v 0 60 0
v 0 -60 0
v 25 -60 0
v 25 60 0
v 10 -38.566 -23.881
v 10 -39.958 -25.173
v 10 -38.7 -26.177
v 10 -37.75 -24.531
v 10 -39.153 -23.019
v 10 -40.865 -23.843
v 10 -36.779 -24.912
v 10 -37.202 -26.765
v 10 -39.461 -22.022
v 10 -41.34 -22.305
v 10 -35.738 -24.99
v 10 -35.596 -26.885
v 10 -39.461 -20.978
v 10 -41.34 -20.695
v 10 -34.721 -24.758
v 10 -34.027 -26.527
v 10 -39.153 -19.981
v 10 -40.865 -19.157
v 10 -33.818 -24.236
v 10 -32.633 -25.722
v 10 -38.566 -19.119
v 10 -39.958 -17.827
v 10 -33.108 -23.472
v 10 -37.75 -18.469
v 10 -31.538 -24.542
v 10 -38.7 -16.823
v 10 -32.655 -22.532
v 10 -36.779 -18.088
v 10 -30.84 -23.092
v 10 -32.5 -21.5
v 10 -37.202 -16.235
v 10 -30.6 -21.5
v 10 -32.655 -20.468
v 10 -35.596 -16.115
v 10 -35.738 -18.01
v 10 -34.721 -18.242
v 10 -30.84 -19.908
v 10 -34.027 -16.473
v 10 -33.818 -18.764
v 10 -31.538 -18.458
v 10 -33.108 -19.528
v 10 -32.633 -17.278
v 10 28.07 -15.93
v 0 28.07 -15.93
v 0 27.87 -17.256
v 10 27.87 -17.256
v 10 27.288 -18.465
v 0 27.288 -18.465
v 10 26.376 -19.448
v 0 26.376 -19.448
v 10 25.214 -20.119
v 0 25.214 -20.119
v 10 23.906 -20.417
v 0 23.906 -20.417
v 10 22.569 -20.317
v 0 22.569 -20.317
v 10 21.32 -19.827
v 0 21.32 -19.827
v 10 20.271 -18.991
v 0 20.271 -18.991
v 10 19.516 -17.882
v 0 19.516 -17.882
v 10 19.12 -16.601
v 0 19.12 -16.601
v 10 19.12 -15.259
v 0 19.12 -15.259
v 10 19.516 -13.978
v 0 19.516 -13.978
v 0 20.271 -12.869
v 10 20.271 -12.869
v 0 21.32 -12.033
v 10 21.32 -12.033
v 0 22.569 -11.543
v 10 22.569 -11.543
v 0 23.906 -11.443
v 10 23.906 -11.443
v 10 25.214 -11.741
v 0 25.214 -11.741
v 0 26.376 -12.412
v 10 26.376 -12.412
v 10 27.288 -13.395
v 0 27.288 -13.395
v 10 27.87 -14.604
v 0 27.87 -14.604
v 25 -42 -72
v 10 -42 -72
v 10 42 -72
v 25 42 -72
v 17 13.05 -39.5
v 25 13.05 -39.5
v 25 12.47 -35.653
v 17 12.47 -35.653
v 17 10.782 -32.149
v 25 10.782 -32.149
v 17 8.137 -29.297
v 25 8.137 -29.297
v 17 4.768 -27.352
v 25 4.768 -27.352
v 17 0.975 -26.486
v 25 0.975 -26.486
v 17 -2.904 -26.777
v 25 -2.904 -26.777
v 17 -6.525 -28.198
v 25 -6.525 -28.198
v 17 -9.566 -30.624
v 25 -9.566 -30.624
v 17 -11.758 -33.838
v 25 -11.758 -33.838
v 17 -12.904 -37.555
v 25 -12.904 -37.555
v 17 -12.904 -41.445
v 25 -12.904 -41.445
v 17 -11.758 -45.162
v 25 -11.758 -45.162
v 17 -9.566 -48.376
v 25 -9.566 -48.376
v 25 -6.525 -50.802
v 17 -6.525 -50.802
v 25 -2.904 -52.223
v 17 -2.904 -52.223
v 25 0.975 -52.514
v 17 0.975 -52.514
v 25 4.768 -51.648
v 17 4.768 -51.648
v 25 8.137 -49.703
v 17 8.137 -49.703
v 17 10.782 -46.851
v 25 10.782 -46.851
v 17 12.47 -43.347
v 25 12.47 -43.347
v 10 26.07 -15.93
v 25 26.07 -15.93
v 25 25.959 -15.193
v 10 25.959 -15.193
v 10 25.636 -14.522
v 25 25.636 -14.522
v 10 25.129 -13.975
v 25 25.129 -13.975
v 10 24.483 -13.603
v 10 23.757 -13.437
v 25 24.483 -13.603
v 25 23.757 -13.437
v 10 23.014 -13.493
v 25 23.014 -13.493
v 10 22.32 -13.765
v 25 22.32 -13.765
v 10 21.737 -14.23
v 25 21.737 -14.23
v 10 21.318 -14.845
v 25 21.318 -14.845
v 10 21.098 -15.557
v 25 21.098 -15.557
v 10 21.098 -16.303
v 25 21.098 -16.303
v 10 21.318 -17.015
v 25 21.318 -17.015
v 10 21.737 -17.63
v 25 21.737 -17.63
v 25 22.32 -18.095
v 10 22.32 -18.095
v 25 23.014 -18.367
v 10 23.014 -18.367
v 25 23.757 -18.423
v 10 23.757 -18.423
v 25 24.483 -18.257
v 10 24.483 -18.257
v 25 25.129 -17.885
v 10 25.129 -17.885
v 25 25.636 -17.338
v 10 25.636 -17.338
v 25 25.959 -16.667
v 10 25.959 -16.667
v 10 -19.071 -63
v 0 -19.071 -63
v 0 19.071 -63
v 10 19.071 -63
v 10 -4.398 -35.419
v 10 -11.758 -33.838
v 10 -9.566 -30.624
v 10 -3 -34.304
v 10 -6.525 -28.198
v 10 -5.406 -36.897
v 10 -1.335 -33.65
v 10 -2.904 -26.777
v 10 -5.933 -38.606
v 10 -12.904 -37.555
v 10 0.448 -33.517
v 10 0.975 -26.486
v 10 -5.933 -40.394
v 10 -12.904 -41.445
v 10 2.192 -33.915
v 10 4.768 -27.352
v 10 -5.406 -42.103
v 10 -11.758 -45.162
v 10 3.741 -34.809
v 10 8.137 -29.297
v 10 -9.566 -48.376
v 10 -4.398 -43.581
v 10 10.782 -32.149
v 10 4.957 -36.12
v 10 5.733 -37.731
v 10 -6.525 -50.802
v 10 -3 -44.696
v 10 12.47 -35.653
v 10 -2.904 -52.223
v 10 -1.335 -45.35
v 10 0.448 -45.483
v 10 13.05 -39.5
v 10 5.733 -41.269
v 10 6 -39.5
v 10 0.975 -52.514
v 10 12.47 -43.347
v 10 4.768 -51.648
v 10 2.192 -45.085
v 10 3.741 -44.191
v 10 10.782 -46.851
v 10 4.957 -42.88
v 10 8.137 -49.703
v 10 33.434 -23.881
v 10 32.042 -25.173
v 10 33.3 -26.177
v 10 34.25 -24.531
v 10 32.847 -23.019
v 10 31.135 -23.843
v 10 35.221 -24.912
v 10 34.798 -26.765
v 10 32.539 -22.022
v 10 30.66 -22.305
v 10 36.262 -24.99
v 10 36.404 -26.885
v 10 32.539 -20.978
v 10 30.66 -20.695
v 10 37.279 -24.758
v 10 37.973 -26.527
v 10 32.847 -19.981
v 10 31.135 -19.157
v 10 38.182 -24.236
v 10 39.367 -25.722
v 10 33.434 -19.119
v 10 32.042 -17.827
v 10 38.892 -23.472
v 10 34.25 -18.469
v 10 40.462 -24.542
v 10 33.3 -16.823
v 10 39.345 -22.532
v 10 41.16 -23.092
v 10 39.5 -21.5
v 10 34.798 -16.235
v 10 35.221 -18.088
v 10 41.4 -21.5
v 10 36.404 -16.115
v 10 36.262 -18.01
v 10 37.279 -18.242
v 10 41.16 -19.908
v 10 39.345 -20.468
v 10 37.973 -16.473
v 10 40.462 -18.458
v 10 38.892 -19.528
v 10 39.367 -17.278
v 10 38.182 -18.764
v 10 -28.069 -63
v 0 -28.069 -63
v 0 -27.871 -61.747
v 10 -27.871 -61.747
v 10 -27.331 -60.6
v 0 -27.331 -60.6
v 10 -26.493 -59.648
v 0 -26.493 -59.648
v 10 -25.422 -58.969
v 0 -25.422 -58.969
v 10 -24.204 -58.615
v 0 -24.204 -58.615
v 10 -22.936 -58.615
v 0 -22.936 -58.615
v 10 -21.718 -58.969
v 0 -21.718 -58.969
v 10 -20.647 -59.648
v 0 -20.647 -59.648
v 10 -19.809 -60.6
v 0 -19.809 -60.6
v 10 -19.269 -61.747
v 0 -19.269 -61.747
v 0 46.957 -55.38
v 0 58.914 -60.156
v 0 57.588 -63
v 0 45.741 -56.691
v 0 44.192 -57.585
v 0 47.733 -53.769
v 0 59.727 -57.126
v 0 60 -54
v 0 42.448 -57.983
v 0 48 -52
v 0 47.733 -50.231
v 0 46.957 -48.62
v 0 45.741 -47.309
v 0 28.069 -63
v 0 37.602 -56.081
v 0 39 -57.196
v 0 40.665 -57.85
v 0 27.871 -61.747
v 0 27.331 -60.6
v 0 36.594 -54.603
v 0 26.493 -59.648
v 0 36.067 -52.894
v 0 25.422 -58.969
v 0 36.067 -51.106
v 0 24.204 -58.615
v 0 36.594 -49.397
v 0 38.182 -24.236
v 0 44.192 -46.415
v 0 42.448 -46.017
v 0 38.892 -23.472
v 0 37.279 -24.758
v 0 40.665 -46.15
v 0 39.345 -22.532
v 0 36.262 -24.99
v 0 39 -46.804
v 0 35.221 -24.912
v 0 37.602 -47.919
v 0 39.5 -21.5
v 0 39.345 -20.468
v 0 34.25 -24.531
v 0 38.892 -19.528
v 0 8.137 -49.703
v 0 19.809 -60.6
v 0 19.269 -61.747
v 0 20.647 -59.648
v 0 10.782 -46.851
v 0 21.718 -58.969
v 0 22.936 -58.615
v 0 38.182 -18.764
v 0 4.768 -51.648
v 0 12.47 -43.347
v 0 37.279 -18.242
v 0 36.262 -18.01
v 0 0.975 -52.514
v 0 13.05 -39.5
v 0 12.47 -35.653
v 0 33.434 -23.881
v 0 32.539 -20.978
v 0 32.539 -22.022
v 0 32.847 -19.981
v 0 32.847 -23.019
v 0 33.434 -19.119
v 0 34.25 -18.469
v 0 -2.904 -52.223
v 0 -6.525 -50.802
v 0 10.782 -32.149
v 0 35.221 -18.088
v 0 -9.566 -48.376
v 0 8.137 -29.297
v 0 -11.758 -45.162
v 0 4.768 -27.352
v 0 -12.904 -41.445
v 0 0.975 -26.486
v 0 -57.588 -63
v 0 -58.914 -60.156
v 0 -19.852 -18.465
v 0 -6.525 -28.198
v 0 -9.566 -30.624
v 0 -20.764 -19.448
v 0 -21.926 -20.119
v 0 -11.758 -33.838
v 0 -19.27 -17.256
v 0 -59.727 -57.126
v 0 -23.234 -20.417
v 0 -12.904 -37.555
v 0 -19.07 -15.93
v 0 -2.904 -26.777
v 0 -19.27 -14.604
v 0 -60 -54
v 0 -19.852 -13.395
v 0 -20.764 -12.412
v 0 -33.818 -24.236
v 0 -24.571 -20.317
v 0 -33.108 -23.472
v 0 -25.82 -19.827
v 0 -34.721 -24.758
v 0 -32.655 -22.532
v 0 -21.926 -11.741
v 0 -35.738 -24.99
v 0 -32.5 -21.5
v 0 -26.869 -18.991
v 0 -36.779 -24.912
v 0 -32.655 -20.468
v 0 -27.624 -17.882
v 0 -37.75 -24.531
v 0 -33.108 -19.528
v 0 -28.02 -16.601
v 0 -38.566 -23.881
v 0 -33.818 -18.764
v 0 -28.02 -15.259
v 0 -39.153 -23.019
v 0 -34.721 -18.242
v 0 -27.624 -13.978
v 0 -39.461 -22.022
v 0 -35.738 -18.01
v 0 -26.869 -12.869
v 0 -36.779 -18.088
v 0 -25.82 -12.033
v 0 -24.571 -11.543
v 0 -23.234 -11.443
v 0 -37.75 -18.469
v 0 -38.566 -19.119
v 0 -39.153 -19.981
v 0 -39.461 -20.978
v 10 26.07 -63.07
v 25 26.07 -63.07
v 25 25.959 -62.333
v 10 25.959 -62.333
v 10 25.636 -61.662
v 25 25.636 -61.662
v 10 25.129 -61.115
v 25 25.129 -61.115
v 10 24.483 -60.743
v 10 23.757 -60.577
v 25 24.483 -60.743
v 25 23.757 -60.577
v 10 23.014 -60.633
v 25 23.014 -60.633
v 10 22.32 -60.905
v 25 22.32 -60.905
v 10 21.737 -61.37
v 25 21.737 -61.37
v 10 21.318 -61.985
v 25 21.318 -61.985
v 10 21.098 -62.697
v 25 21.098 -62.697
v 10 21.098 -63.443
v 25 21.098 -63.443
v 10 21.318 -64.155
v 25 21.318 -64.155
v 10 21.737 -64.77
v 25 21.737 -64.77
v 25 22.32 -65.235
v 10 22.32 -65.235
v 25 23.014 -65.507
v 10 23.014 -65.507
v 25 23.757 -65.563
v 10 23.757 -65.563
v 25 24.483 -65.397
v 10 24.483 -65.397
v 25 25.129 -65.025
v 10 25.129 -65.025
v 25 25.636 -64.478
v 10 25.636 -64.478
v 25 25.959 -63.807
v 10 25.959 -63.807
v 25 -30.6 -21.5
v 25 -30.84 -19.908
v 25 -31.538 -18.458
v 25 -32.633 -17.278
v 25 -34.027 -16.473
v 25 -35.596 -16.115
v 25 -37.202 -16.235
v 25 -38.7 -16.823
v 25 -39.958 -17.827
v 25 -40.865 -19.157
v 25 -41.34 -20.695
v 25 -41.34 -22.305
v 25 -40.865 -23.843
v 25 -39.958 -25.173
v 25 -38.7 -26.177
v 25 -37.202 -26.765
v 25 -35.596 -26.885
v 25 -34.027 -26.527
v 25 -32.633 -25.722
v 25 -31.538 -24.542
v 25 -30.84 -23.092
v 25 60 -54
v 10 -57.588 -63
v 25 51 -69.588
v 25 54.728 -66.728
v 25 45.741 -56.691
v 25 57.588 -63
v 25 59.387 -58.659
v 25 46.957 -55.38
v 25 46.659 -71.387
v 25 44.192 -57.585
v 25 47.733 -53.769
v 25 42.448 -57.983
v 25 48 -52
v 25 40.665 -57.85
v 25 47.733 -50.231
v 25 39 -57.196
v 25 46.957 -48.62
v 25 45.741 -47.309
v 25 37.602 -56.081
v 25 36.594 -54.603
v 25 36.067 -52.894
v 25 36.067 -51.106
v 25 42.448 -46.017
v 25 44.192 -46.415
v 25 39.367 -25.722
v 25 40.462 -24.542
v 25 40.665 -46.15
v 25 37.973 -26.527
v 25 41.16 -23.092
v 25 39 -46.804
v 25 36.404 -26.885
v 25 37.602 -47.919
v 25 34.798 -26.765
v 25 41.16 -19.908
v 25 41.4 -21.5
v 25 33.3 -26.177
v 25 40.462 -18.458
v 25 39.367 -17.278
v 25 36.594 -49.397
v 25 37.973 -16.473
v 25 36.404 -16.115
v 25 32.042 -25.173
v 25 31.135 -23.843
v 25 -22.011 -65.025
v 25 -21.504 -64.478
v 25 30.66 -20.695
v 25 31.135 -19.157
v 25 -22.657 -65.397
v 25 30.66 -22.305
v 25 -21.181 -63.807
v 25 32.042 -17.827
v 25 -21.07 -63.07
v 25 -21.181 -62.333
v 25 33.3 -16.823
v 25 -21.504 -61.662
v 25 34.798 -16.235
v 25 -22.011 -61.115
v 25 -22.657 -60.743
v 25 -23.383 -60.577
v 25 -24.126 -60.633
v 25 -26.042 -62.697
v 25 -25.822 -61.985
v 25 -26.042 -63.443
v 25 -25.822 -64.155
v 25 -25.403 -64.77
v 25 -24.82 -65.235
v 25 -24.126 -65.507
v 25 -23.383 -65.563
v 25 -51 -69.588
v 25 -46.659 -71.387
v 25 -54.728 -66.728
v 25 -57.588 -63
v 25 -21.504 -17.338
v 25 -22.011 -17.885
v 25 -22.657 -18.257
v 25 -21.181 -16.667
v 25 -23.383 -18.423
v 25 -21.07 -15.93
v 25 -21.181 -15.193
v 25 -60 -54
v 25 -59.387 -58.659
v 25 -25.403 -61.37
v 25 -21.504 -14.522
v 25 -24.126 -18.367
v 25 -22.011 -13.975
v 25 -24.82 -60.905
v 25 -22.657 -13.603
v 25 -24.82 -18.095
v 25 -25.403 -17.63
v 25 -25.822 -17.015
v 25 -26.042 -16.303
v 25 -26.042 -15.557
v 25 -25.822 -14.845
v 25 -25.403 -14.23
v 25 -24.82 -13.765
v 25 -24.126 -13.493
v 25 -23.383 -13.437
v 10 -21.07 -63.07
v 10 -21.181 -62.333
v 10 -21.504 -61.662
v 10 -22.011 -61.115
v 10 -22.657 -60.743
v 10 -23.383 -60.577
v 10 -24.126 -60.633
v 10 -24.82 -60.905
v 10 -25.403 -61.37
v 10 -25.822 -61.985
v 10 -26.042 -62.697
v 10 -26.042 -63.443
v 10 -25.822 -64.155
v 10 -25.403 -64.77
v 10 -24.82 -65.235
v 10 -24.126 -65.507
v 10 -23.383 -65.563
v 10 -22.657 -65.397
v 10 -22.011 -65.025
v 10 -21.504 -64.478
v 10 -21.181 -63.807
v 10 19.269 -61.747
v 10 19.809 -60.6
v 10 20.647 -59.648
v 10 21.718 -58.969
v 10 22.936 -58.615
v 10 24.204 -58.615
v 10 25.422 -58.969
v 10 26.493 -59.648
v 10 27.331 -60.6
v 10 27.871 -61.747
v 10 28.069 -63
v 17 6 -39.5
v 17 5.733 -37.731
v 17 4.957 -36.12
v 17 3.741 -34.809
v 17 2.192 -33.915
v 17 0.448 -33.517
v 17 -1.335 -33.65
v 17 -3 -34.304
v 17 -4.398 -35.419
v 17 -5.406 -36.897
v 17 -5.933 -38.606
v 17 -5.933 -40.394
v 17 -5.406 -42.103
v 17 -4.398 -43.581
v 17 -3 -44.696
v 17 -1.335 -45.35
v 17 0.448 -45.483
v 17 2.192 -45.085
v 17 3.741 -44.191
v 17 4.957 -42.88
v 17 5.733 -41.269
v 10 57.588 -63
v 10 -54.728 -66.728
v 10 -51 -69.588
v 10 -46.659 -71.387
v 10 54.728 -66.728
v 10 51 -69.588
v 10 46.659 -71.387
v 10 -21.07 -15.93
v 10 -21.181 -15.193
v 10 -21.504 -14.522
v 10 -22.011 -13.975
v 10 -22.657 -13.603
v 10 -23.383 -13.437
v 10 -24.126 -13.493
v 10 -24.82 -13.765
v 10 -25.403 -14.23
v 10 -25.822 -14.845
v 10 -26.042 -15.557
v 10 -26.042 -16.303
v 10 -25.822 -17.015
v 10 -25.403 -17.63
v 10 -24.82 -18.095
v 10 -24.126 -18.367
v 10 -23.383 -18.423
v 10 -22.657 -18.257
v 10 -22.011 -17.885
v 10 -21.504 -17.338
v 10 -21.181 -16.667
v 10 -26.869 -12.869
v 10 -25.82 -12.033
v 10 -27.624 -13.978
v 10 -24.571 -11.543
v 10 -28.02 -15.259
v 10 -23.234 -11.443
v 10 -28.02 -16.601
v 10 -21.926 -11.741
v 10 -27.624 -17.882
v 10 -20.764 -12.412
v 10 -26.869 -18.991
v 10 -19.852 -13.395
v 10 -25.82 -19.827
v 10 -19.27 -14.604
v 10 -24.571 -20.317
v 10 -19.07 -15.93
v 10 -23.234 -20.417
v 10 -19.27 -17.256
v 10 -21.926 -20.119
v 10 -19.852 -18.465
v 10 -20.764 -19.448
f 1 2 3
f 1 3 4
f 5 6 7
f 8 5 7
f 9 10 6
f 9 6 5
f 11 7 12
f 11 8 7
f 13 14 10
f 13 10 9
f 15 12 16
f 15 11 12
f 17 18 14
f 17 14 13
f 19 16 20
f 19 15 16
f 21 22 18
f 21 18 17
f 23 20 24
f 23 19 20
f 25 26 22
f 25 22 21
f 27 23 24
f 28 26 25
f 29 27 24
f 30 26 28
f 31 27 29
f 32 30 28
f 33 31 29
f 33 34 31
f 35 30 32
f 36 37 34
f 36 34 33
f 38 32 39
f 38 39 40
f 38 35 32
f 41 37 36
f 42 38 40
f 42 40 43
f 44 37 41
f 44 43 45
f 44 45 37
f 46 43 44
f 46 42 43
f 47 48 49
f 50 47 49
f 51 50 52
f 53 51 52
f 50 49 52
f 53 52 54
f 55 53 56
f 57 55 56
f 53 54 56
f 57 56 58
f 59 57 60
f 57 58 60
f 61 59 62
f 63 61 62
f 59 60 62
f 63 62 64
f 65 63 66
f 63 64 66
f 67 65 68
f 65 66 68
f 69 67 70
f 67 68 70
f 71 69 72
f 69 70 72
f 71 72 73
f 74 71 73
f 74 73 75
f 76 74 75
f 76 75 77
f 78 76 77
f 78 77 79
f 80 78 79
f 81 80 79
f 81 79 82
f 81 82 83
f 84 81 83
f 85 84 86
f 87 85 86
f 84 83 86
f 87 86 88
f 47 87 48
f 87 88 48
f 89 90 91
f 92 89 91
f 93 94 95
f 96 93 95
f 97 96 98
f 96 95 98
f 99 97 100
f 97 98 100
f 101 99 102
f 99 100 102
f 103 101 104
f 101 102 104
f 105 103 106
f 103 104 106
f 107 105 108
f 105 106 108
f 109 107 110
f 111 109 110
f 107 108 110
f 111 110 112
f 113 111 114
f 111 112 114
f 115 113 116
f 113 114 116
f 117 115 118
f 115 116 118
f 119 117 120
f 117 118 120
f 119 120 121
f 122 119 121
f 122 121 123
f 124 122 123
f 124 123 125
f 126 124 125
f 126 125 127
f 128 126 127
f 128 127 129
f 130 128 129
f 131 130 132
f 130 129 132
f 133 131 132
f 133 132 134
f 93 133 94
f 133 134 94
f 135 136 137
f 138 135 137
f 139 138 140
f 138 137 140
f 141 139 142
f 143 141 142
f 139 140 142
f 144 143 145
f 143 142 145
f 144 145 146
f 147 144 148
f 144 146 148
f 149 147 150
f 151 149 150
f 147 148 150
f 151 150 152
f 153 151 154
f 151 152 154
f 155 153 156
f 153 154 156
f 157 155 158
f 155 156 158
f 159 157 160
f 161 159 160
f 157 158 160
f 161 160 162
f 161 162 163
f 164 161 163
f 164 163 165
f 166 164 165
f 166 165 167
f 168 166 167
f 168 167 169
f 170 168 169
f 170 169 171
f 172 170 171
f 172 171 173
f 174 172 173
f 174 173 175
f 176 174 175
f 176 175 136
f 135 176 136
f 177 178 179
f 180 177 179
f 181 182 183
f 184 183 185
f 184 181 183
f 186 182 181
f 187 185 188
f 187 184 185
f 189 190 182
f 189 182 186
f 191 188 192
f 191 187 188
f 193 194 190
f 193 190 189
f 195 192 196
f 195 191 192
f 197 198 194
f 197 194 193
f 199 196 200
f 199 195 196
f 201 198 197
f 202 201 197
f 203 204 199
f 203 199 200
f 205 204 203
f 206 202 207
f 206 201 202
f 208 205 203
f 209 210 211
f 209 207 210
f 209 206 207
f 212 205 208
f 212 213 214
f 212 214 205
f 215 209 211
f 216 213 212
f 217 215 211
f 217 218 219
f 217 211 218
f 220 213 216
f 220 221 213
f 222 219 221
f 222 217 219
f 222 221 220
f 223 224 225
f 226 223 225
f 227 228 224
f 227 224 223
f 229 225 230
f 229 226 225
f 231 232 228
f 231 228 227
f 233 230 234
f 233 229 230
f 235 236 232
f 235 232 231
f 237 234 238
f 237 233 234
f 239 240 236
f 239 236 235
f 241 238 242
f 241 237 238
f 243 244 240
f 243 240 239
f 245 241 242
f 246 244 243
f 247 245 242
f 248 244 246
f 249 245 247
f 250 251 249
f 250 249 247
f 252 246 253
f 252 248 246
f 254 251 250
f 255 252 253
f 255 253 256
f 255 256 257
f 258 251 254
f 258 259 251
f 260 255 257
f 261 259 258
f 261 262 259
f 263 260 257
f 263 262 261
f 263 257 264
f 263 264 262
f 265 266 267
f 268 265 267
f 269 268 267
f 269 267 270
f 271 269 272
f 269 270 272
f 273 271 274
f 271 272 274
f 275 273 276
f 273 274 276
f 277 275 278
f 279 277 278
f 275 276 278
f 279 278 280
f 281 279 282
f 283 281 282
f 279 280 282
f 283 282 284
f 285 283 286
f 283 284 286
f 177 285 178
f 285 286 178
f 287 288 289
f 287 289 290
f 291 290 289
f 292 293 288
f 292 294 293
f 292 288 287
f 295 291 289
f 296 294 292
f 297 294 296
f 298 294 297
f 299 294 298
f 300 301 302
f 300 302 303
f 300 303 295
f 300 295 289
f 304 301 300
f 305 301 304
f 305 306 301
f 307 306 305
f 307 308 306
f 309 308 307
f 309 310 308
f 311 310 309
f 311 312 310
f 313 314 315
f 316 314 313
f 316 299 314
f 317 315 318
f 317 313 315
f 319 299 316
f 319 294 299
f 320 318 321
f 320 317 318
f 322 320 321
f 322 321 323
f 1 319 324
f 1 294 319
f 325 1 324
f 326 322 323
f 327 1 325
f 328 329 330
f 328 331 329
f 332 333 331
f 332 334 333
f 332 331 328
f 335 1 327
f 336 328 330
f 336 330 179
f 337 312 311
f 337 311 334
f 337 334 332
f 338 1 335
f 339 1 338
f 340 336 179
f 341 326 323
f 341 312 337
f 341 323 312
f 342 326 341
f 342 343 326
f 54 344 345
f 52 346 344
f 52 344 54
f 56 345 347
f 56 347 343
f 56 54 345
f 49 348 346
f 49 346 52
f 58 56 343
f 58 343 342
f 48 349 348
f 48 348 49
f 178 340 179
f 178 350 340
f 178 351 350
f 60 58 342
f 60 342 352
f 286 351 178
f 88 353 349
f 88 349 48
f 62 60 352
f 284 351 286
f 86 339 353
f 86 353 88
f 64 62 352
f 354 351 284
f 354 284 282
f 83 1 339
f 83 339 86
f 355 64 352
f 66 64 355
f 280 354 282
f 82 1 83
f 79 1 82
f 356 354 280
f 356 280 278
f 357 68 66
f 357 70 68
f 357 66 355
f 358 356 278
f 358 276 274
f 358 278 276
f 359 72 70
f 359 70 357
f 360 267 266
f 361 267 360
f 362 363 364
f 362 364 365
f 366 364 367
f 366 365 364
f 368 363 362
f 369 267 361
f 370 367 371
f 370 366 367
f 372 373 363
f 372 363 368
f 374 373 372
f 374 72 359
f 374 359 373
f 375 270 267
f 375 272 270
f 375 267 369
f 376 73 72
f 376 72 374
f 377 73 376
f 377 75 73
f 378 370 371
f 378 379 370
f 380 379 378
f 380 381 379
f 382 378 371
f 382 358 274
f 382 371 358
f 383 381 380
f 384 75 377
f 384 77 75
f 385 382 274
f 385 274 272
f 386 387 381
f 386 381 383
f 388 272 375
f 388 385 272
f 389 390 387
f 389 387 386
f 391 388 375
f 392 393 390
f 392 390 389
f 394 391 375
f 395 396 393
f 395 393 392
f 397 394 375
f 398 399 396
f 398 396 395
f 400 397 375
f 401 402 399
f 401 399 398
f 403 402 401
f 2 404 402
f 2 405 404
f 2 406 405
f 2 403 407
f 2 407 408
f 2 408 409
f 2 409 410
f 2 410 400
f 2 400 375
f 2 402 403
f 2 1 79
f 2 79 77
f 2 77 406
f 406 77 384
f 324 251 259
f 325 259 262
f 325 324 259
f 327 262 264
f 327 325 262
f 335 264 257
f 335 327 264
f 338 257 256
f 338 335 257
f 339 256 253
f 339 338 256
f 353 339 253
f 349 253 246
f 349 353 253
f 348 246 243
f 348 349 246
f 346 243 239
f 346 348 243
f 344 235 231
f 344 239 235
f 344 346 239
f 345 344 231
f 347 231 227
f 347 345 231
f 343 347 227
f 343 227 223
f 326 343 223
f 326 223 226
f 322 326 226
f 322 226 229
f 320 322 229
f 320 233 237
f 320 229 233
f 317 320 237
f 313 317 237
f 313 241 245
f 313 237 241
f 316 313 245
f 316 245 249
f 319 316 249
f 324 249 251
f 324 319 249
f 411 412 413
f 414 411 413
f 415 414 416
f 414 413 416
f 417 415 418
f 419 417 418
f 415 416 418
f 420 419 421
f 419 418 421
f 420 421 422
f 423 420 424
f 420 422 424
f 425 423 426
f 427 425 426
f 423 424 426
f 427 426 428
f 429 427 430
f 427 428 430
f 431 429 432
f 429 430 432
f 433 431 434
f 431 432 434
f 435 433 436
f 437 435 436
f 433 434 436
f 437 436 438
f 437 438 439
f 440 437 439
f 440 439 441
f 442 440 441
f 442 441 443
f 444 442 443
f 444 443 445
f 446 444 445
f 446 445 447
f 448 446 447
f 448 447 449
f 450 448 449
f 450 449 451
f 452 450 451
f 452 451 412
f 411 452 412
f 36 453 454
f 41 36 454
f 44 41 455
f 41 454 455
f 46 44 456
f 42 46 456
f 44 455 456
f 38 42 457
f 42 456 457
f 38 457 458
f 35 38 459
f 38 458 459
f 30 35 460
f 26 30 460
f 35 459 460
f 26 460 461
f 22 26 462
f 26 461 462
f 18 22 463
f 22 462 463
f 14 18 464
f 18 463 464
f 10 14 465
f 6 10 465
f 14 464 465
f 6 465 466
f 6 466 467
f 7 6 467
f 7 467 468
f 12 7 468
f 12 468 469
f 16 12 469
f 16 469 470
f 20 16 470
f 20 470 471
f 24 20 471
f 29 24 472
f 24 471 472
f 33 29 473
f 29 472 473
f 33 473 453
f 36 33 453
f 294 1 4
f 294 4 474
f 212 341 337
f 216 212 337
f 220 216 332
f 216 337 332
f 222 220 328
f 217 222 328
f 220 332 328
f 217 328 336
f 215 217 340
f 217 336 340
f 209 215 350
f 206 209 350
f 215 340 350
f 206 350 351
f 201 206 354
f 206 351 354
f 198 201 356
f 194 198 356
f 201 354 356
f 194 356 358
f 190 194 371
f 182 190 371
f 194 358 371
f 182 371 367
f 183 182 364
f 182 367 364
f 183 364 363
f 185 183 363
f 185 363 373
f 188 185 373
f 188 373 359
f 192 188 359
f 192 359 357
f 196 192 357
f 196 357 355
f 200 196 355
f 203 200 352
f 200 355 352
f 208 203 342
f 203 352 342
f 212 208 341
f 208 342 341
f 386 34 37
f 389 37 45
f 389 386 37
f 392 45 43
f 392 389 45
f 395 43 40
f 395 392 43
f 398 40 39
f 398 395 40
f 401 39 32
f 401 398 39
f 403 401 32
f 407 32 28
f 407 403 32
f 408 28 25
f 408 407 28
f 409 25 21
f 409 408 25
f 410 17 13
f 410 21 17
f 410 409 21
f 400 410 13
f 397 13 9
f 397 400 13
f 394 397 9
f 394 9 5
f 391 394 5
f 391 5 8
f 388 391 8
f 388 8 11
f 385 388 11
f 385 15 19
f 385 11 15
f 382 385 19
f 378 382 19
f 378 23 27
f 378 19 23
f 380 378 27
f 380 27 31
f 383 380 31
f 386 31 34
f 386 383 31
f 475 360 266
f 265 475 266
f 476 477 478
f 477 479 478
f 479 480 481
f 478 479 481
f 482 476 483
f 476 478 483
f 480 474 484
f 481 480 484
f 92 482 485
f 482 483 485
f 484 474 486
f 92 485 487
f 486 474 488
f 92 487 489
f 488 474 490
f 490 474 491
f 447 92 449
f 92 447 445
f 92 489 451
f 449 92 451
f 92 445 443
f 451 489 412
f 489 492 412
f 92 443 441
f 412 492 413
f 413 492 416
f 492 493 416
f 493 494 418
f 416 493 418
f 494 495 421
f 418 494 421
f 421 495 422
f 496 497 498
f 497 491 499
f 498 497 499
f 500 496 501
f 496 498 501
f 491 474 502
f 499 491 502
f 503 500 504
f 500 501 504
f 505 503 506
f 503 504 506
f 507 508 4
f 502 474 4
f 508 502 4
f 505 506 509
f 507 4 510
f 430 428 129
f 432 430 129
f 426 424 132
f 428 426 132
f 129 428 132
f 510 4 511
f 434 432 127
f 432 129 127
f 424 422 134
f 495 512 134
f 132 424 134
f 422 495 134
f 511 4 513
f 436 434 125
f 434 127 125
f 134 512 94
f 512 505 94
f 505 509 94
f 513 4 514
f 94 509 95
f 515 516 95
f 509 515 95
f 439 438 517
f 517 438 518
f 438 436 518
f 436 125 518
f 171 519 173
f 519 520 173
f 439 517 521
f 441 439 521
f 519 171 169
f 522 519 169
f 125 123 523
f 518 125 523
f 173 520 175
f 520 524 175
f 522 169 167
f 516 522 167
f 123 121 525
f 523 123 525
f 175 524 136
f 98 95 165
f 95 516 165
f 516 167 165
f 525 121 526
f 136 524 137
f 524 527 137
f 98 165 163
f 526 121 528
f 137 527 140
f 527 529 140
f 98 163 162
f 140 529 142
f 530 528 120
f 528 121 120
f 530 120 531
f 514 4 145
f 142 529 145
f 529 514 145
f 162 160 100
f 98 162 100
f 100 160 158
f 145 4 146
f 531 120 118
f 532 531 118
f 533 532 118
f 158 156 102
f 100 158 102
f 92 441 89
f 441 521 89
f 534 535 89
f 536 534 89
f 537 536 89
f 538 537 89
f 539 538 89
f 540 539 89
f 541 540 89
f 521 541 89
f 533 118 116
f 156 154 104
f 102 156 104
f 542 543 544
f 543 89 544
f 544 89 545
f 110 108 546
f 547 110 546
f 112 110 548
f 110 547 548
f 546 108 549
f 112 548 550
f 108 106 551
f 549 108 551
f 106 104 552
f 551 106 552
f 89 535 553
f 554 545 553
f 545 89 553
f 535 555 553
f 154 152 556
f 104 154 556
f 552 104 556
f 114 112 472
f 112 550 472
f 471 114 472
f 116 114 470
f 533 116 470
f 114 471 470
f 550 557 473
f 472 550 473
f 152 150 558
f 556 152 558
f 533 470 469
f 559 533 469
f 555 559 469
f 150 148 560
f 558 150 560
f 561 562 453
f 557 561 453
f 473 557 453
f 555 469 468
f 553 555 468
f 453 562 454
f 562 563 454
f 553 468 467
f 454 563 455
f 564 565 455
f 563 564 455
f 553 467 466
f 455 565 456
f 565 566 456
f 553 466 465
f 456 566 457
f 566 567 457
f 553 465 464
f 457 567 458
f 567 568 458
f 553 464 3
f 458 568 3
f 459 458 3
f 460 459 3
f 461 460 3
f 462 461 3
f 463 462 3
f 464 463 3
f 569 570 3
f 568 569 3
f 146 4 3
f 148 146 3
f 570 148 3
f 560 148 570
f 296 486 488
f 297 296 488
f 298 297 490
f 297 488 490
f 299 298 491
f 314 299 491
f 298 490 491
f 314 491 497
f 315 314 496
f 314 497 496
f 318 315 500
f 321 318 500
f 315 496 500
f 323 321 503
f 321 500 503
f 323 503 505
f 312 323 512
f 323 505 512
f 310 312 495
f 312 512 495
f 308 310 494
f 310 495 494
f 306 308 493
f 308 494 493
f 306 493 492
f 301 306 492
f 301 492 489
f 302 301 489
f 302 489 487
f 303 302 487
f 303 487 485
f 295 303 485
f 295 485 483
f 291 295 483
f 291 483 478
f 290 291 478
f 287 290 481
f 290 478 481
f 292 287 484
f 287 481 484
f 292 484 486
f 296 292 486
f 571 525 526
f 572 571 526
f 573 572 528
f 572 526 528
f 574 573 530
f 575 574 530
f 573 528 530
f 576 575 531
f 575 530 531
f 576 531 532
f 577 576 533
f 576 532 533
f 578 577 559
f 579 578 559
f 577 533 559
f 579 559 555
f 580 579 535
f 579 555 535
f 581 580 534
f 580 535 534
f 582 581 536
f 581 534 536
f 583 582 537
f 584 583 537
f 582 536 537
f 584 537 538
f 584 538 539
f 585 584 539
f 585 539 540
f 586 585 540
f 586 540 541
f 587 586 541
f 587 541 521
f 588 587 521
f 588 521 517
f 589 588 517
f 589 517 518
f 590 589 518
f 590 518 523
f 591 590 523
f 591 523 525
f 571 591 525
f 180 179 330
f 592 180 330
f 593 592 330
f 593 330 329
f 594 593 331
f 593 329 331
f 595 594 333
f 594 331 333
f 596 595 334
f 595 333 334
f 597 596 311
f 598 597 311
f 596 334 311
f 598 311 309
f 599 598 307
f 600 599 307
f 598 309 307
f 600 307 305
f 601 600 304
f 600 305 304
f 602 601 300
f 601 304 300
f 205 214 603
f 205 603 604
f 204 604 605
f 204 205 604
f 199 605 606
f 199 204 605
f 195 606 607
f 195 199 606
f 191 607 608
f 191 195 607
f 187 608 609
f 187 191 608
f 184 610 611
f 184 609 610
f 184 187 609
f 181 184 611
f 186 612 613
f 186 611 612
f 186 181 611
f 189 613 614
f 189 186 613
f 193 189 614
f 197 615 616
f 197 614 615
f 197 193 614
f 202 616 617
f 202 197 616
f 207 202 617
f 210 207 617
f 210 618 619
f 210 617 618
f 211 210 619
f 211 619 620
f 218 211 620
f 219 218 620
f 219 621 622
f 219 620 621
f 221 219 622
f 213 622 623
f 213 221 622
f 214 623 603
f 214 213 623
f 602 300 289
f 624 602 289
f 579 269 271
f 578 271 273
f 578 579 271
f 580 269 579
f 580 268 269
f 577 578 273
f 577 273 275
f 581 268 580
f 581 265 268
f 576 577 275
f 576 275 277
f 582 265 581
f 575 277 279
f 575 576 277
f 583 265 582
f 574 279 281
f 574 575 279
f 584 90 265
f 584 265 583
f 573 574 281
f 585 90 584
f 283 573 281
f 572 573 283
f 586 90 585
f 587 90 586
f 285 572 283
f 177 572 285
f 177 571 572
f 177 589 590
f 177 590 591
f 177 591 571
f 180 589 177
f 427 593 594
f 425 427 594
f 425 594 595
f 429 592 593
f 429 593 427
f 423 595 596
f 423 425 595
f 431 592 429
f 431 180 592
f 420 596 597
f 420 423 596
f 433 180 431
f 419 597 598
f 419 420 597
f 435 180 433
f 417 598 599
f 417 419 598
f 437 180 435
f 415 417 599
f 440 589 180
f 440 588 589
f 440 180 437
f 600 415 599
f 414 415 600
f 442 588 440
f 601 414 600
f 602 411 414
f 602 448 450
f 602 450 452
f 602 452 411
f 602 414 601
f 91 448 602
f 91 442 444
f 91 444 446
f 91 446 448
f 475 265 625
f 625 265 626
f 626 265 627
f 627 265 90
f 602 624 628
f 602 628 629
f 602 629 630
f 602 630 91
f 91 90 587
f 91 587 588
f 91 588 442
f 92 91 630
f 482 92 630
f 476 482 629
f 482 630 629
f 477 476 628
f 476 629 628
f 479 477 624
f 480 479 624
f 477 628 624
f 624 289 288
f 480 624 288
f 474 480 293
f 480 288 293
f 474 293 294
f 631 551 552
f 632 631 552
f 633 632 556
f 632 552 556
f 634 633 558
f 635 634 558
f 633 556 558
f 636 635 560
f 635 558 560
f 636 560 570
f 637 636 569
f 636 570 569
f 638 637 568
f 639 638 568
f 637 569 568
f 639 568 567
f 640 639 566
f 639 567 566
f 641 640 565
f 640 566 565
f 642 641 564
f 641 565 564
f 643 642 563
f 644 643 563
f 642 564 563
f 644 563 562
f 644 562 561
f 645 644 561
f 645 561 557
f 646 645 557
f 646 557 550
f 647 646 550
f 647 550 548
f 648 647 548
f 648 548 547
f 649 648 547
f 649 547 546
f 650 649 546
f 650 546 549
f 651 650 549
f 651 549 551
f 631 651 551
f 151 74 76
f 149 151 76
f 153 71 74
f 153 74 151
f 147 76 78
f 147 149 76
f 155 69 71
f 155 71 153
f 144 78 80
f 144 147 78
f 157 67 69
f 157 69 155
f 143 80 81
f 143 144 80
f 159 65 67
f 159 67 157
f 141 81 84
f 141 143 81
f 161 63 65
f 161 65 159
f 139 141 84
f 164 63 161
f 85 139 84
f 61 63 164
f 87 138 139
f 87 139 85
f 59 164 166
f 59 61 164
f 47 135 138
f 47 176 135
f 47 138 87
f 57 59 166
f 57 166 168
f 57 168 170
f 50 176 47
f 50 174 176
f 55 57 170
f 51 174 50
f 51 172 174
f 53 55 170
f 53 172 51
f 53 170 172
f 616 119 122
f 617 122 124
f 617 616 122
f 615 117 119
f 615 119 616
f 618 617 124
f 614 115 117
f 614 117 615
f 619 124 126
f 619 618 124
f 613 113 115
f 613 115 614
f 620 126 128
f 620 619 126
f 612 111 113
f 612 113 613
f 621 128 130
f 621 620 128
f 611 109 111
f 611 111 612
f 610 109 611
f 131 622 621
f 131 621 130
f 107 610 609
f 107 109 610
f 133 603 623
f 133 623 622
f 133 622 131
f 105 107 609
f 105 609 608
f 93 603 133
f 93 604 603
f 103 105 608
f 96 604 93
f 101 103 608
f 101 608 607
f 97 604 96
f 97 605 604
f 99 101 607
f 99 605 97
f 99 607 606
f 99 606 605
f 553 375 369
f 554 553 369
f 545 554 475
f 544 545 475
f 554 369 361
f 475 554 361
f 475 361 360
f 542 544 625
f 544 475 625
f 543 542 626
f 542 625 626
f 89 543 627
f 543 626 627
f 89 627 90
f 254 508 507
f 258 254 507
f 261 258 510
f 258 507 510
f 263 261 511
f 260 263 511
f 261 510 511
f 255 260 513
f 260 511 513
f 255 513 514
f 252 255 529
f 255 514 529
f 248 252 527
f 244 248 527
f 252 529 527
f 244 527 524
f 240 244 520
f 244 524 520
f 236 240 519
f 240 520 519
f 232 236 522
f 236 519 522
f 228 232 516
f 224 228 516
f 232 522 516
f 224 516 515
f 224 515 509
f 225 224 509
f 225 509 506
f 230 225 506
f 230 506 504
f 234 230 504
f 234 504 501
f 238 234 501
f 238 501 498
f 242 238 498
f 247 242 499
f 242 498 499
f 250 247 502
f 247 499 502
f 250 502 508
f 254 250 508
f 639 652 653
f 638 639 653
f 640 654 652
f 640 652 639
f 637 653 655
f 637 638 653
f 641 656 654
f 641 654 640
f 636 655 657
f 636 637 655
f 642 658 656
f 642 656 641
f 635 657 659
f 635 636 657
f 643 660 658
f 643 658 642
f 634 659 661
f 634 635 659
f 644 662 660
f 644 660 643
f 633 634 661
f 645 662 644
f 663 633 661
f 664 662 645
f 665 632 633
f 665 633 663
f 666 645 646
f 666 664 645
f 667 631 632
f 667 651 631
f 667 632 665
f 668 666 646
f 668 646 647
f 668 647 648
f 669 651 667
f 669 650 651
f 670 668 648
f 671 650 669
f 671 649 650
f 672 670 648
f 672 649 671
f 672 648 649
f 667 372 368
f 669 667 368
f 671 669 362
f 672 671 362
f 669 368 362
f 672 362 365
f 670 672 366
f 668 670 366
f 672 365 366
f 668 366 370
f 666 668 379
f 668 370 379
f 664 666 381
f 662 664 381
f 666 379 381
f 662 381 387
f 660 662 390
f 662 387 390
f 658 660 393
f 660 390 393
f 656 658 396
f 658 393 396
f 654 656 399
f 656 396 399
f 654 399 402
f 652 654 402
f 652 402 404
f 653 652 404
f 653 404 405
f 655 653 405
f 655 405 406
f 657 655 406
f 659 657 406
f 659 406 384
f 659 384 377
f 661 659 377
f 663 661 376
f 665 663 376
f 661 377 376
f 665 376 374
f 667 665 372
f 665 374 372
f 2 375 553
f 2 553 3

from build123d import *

# Parameters (mm, degrees)
SKETCH_R        = 3.5
SKETCH_R_2      = 6
PAD_DEPTH       = 25
SKETCH001_R     = 5.4
POCKET_DEPTH    = 15
SKETCH002_R     = 13.05
POCKET001_DEPTH = 10
SKETCH006_R     = 2.5
SKETCH006_R_2   = 6
POCKET002_DEPTH = 25
SKETCH005_R     = 4.5
POCKET003_DEPTH = 10
SKETCH007_R     = 13.05
POCKET004_DEPTH = 8
SKETCH009_W     = 120
SKETCH009_H     = 9
POCKET005_DEPTH = 10


with BuildPart() as part:
    # Sketch → Pad (new body)
    with BuildSketch(Plane.YZ):
        with BuildLine():
            Line((-60, -53.999958), (-60, 0))
            Line((-60, 0), (60, 0))
            Line((60, 0), (60, -53.999958))
            ThreePointArc((42.00001, -72), (54.72794, -66.727904), (60, -53.999958))
            Line((-42.00001, -72), (42.00001, -72))
            ThreePointArc((-60, -53.999958), (-54.72794, -66.727904), (-42.00001, -72))
        make_face()
        with Locations((-36, -21.5)):
            Circle(SKETCH_R, mode=Mode.SUBTRACT)
        with Locations((36, -21.5)):
            Circle(SKETCH_R, mode=Mode.SUBTRACT)
        with Locations((0, -39.5)):
            Circle(SKETCH_R_2, mode=Mode.SUBTRACT)
    extrude(amount=PAD_DEPTH)

    # Sketch001 → Pocket (cut)
    with BuildSketch(Plane.YZ.offset(25)):
        with Locations((-36, -21.5)):
            Circle(SKETCH001_R)
        with Locations((36, -21.5)):
            Circle(SKETCH001_R)
    extrude(amount=-POCKET_DEPTH, mode=Mode.SUBTRACT)

    # Sketch002 → Pocket001 (cut)
    with BuildSketch(Plane(origin=(0, 0, 0), x_dir=(0, 1, 0), z_dir=(-1, 0, 0))):
        with Locations((0, 39.5)):
            Circle(SKETCH002_R)
    extrude(amount=-POCKET001_DEPTH, mode=Mode.SUBTRACT)

    # Sketch006 → Pocket002 (cut)
    with BuildSketch(Plane.YZ.offset(25)):
        with Locations((-23.57, -15.93)):
            Circle(SKETCH006_R)
        with Locations((23.57, -15.93)):
            Circle(SKETCH006_R)
        with Locations((-23.57, -63.07)):
            Circle(SKETCH006_R)
        with Locations((23.57, -63.07)):
            Circle(SKETCH006_R)
        with Locations((42, -52)):
            Circle(SKETCH006_R_2)
    extrude(amount=-POCKET002_DEPTH, mode=Mode.SUBTRACT)

    # Sketch005 → Pocket003 (cut)
    with BuildSketch(Plane(origin=(0, 0, 0), x_dir=(0, 1, 0), z_dir=(-1, 0, 0))):
        with Locations((-23.57, 63.07)):
            Circle(SKETCH005_R)
        with Locations((23.57, 63.07)):
            Circle(SKETCH005_R)
        with Locations((-23.57, 15.93)):
            Circle(SKETCH005_R)
        with Locations((23.57, 15.93)):
            Circle(SKETCH005_R)
    extrude(amount=-POCKET003_DEPTH, mode=Mode.SUBTRACT)

    # Sketch007 → Pocket004 (cut)
    with BuildSketch(Plane.YZ.offset(25)):
        with Locations((0, -39.5)):
            Circle(SKETCH007_R)
    extrude(amount=-POCKET004_DEPTH, mode=Mode.SUBTRACT)

    # Sketch009 → Pocket005 (cut)
    with BuildSketch(Plane(origin=(0, 0, 0), x_dir=(0, 1, 0), z_dir=(-1, 0, 0))):
        with Locations((0, 67.5)):
            Rectangle(SKETCH009_W, SKETCH009_H)
    extrude(amount=-POCKET005_DEPTH, mode=Mode.SUBTRACT)


solid = part.part
